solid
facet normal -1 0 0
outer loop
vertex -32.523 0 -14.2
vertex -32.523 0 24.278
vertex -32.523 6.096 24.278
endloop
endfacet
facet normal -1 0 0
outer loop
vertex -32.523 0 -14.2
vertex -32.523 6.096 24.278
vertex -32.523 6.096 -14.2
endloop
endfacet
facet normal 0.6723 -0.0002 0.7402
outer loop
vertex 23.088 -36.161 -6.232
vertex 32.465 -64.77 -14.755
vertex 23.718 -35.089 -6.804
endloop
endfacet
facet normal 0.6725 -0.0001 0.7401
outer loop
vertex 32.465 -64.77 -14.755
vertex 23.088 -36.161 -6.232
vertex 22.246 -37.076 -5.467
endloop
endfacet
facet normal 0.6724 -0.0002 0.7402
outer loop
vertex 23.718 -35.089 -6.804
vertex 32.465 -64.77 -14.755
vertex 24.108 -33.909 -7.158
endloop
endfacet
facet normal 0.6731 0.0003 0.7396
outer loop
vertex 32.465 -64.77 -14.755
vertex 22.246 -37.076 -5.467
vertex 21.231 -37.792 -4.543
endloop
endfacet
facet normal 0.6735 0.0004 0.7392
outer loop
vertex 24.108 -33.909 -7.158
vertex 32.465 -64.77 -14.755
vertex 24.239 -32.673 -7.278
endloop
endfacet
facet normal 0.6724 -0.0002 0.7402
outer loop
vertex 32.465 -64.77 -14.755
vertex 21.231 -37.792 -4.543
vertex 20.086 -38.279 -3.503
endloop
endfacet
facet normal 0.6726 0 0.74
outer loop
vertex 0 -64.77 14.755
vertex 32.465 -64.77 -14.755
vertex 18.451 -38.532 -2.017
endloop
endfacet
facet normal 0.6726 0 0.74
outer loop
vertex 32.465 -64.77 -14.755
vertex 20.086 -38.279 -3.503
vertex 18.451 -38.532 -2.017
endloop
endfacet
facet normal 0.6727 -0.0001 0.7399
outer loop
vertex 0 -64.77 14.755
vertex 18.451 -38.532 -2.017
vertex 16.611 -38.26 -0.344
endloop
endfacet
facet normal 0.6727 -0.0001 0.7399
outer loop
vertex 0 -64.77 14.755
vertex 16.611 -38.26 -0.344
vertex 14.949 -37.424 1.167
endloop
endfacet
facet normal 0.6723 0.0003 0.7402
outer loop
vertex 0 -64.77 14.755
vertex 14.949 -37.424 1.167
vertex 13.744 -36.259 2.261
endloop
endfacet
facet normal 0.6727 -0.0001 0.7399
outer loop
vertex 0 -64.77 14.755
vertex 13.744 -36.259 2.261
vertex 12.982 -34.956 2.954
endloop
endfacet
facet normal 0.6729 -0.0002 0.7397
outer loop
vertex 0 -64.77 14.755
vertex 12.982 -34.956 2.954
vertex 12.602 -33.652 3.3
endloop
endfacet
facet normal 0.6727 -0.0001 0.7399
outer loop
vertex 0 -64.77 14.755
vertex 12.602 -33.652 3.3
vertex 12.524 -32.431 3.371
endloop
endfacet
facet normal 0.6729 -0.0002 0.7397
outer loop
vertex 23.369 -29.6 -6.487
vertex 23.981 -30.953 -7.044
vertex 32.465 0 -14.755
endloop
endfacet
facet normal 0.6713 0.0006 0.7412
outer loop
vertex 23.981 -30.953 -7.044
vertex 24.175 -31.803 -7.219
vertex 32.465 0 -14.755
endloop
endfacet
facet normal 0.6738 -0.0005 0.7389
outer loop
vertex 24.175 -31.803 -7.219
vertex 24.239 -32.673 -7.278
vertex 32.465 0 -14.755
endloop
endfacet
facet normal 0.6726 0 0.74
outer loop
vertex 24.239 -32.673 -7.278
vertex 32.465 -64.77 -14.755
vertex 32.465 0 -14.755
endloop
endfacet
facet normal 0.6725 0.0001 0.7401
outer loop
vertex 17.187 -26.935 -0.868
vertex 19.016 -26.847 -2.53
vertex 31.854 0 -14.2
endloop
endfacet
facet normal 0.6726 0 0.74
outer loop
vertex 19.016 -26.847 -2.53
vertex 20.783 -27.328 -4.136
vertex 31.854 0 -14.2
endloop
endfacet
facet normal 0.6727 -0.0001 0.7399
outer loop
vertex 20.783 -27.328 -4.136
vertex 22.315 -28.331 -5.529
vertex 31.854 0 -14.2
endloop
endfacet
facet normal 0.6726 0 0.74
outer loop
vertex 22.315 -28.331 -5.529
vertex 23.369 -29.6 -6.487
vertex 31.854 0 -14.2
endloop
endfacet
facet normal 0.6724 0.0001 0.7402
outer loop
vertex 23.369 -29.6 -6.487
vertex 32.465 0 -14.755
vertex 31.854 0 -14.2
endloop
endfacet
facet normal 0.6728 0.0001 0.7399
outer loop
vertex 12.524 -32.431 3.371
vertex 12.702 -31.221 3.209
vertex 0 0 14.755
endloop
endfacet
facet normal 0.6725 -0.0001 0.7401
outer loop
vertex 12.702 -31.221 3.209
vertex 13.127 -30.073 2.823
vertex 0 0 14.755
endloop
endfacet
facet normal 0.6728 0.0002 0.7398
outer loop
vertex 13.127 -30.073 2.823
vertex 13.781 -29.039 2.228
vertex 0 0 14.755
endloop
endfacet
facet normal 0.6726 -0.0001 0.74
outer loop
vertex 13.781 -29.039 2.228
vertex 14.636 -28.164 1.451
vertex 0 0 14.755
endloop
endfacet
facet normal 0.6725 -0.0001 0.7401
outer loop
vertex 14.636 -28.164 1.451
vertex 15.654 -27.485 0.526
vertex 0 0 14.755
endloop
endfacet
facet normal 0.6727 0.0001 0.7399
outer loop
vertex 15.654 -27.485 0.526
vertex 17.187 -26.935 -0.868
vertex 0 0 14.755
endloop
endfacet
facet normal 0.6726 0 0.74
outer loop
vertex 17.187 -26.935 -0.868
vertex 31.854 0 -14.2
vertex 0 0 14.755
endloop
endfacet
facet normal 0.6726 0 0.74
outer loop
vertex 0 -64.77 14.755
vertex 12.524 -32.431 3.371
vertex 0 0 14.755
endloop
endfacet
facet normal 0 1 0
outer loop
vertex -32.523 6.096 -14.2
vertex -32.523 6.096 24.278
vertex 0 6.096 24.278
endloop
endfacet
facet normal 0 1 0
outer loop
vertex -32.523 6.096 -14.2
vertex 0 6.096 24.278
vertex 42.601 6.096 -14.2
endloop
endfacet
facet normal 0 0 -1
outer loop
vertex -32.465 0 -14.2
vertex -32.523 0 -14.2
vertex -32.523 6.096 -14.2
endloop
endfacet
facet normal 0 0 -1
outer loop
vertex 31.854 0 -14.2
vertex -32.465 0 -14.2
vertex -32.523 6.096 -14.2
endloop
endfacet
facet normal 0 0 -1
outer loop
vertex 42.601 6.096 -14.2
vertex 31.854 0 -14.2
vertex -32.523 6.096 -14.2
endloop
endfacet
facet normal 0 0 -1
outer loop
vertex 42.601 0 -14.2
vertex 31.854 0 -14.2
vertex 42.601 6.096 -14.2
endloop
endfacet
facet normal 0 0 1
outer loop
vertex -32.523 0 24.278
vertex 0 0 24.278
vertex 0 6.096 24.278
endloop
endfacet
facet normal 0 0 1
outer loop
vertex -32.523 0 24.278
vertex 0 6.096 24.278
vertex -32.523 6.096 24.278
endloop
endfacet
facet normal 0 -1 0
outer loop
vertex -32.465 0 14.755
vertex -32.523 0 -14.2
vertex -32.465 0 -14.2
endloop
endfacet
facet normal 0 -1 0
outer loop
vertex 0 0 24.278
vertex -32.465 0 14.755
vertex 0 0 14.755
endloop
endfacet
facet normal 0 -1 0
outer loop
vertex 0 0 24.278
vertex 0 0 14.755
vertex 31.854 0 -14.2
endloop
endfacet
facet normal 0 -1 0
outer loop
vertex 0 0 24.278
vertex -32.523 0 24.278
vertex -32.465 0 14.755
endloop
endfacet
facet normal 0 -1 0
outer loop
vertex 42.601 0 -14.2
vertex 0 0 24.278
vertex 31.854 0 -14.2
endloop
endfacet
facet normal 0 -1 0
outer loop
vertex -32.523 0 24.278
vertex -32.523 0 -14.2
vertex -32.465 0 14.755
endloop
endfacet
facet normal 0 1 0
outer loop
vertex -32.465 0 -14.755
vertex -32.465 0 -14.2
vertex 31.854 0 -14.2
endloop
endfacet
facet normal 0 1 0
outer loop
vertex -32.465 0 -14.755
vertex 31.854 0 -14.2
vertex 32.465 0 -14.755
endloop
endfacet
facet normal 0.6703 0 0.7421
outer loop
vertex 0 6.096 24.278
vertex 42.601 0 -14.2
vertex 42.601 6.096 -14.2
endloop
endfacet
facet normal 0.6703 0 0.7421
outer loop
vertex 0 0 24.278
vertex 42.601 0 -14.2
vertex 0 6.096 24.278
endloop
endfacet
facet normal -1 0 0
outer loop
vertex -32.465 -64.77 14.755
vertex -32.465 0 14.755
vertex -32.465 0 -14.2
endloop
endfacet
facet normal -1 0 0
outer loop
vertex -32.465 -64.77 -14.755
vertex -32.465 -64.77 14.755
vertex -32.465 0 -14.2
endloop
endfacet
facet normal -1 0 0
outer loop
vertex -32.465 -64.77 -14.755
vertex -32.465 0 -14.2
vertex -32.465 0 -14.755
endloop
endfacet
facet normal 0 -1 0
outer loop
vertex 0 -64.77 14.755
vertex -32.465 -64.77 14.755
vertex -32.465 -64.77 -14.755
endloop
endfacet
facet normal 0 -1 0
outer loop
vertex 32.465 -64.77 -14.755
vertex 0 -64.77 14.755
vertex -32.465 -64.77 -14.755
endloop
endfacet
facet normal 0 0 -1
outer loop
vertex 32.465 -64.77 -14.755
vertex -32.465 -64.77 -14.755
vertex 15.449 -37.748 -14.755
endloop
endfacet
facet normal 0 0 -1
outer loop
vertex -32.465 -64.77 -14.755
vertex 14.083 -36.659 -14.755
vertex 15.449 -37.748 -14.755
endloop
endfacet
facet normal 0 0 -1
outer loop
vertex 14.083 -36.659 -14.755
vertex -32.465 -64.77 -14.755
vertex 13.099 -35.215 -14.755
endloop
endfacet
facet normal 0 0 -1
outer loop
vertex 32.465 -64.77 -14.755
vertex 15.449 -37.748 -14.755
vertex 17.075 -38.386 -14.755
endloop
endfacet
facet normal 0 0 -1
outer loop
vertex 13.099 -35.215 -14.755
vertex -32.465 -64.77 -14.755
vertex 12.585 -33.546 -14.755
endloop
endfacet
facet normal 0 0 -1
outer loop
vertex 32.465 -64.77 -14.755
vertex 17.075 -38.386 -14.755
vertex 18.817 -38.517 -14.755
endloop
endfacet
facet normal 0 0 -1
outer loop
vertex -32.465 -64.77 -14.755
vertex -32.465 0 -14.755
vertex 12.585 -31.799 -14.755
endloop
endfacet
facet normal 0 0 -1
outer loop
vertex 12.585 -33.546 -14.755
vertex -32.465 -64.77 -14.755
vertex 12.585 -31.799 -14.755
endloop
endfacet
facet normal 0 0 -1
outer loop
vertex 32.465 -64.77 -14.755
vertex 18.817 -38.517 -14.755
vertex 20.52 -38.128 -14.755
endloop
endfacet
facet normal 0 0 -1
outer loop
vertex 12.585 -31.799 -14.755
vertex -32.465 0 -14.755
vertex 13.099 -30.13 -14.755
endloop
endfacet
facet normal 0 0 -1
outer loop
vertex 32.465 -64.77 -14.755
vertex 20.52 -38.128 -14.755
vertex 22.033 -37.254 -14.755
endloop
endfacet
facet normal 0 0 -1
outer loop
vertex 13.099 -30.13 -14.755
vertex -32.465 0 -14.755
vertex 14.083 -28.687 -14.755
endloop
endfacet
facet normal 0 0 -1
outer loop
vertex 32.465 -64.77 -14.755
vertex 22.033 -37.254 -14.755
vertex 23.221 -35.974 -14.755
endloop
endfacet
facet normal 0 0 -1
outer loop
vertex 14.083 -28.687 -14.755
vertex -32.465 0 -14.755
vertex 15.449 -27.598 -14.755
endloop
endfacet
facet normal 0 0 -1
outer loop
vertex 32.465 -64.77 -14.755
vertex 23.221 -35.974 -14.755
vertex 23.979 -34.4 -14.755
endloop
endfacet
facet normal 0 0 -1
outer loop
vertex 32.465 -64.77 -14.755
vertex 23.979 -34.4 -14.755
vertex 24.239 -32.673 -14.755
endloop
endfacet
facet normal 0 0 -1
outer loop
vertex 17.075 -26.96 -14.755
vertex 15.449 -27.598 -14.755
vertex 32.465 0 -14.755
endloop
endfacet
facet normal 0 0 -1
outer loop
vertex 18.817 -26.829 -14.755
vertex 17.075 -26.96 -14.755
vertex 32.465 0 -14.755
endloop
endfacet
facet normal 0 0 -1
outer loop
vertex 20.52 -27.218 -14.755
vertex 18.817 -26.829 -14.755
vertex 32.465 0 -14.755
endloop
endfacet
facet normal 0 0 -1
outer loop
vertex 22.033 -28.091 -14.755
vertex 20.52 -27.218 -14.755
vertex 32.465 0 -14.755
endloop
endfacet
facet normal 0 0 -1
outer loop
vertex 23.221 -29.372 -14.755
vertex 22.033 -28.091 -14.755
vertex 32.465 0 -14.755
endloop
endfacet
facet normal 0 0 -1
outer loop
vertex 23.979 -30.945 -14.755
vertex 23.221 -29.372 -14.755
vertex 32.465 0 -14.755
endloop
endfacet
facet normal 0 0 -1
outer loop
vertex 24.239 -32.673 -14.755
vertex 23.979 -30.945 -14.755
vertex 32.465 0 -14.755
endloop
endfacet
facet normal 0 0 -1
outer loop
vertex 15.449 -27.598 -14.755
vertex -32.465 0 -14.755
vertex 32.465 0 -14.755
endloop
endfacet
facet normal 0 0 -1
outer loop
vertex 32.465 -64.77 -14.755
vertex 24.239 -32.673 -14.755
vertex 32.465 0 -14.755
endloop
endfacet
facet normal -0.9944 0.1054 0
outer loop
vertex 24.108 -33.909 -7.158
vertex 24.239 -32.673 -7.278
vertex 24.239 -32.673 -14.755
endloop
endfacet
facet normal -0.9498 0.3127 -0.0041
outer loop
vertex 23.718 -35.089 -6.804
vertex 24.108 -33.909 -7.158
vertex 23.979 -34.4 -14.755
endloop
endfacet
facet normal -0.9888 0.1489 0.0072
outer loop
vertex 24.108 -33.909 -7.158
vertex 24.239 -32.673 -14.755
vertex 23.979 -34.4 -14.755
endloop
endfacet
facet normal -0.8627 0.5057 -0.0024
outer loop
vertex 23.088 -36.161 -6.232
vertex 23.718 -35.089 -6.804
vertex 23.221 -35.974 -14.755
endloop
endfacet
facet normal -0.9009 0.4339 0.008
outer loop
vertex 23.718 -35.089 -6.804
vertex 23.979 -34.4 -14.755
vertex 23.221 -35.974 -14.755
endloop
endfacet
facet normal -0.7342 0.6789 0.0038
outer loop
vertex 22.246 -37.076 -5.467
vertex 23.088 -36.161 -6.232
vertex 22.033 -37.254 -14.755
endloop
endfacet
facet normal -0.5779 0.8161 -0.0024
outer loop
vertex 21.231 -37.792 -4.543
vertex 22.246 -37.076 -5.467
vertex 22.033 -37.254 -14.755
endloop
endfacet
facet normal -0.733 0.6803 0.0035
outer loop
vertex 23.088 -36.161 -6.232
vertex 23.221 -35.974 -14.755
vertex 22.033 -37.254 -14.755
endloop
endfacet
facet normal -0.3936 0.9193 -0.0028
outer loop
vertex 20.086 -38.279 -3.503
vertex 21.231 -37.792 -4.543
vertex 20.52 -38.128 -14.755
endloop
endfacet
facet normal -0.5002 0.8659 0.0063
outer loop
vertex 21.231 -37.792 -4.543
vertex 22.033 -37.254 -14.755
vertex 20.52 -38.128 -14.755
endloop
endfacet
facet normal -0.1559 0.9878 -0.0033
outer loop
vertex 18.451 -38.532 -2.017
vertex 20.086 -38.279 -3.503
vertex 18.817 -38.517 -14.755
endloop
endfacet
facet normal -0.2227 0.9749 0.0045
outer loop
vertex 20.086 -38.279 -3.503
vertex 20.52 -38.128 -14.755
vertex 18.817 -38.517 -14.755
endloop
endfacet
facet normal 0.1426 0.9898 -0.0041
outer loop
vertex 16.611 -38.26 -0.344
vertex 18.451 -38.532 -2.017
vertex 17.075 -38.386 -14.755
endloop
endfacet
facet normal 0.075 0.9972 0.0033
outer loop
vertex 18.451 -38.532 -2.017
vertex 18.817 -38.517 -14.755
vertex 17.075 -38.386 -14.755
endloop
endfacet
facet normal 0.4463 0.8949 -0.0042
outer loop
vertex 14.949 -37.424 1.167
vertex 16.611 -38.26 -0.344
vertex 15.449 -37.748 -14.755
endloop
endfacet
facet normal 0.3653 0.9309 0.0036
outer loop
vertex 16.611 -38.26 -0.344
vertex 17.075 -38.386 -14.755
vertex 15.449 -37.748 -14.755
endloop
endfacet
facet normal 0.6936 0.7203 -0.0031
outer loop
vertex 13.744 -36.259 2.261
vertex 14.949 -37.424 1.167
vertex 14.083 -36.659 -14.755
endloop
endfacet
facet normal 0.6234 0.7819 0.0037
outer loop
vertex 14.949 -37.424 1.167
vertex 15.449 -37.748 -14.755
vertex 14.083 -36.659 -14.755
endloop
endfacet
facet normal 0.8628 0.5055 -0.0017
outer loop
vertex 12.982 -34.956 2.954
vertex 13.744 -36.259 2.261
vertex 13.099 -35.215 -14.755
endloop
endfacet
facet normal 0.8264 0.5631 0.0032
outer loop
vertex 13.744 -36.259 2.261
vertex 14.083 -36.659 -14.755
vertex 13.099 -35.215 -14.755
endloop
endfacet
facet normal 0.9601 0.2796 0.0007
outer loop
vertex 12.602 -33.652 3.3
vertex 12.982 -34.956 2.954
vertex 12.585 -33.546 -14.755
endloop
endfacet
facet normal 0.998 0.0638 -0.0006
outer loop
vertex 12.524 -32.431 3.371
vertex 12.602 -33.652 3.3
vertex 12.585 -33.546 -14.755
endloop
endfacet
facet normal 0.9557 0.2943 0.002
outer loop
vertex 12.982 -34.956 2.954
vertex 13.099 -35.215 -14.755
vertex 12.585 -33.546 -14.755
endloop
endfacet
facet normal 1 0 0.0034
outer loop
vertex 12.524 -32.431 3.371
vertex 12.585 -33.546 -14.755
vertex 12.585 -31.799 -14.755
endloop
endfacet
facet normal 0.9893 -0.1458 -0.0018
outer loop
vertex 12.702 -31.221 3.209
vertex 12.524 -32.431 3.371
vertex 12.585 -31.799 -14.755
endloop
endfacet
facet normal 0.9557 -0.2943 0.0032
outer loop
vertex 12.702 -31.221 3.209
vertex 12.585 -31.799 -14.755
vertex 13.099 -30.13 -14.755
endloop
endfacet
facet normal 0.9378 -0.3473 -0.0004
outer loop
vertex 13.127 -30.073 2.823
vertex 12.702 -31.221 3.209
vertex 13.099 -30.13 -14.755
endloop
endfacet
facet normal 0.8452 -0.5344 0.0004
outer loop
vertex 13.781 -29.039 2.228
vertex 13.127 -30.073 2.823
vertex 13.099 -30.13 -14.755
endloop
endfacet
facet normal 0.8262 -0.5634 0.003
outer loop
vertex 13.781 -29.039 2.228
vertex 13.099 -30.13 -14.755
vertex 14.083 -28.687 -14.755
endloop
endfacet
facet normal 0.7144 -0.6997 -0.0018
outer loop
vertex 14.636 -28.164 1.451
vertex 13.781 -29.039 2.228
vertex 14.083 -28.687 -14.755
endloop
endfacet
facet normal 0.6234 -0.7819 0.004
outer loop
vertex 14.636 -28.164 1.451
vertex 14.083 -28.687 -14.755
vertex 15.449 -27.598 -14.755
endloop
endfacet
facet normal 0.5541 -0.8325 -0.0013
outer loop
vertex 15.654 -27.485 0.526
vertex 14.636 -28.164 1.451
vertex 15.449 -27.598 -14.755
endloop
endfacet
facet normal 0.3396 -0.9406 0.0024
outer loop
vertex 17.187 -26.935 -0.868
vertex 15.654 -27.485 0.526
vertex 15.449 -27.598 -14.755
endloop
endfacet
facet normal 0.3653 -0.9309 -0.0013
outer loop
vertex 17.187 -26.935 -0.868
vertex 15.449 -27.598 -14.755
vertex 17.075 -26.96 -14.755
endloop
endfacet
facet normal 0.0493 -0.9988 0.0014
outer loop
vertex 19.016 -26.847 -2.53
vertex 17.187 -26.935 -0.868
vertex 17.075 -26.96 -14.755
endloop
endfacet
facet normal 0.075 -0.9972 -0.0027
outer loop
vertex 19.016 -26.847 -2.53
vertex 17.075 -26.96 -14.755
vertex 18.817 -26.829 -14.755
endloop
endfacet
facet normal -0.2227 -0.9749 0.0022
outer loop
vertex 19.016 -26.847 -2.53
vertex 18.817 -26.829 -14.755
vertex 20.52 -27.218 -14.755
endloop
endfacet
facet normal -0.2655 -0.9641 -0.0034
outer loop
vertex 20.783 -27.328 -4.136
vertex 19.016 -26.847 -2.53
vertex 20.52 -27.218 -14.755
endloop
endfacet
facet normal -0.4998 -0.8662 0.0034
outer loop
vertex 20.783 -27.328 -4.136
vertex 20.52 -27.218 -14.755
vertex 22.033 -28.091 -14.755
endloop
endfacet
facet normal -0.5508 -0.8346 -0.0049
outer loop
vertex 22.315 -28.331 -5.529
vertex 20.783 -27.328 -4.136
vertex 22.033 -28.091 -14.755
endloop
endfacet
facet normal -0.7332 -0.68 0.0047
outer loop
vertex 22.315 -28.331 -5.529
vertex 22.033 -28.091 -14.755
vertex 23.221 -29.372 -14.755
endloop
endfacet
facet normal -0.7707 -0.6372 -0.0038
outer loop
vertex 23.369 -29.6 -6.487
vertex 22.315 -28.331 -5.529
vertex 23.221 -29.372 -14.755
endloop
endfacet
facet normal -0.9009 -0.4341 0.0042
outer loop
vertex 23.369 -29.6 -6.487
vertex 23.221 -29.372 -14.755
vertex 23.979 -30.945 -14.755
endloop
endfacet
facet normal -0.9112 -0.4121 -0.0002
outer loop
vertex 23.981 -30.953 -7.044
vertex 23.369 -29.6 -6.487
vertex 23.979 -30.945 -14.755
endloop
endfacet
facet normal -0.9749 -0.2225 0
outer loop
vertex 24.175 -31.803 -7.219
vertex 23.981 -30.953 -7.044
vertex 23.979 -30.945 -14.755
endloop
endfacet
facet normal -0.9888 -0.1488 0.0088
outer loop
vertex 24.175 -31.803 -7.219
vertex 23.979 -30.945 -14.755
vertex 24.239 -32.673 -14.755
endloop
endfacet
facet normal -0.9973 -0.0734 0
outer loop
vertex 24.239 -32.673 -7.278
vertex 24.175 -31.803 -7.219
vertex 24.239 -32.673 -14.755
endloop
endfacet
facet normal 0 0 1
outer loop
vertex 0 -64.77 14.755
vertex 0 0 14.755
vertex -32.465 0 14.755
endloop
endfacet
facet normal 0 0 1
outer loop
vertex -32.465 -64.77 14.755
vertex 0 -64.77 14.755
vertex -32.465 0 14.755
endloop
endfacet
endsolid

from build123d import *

# Parameters (mm, degrees)
F1_DEPTH = 64.77
F3_DEPTH = 6.096
F4_R     = 5.860141
F5_DEPTH = 79.248


with BuildPart() as f1:
    # F0 (on Front) → F1 (new body)
    with BuildSketch(Plane.XZ):
        Polygon((32.464709, -14.754961), (0, 14.754961), (-32.464709, 14.754961), (-32.464709, -14.754961), align=None)
    extrude(amount=F1_DEPTH)

    # F2 (on Front) → F3 (join)
    with BuildSketch(Plane.XZ):
        Polygon((-32.523151, -14.200249), (42.600743, -14.200249), (0, 24.277844), (-32.523151, 24.277844), align=None)
    extrude(amount=-F3_DEPTH)

    # F4 (on face) → F5 (cut)
    with BuildSketch(Plane(origin=(0, 0, -14.754961), x_dir=(1, 0, 0), z_dir=(0, 0, -1))):
        with Locations((18.379251, 32.672778)):
            Circle(F4_R)
    extrude(amount=-F5_DEPTH, mode=Mode.SUBTRACT)


solid = f1.part
